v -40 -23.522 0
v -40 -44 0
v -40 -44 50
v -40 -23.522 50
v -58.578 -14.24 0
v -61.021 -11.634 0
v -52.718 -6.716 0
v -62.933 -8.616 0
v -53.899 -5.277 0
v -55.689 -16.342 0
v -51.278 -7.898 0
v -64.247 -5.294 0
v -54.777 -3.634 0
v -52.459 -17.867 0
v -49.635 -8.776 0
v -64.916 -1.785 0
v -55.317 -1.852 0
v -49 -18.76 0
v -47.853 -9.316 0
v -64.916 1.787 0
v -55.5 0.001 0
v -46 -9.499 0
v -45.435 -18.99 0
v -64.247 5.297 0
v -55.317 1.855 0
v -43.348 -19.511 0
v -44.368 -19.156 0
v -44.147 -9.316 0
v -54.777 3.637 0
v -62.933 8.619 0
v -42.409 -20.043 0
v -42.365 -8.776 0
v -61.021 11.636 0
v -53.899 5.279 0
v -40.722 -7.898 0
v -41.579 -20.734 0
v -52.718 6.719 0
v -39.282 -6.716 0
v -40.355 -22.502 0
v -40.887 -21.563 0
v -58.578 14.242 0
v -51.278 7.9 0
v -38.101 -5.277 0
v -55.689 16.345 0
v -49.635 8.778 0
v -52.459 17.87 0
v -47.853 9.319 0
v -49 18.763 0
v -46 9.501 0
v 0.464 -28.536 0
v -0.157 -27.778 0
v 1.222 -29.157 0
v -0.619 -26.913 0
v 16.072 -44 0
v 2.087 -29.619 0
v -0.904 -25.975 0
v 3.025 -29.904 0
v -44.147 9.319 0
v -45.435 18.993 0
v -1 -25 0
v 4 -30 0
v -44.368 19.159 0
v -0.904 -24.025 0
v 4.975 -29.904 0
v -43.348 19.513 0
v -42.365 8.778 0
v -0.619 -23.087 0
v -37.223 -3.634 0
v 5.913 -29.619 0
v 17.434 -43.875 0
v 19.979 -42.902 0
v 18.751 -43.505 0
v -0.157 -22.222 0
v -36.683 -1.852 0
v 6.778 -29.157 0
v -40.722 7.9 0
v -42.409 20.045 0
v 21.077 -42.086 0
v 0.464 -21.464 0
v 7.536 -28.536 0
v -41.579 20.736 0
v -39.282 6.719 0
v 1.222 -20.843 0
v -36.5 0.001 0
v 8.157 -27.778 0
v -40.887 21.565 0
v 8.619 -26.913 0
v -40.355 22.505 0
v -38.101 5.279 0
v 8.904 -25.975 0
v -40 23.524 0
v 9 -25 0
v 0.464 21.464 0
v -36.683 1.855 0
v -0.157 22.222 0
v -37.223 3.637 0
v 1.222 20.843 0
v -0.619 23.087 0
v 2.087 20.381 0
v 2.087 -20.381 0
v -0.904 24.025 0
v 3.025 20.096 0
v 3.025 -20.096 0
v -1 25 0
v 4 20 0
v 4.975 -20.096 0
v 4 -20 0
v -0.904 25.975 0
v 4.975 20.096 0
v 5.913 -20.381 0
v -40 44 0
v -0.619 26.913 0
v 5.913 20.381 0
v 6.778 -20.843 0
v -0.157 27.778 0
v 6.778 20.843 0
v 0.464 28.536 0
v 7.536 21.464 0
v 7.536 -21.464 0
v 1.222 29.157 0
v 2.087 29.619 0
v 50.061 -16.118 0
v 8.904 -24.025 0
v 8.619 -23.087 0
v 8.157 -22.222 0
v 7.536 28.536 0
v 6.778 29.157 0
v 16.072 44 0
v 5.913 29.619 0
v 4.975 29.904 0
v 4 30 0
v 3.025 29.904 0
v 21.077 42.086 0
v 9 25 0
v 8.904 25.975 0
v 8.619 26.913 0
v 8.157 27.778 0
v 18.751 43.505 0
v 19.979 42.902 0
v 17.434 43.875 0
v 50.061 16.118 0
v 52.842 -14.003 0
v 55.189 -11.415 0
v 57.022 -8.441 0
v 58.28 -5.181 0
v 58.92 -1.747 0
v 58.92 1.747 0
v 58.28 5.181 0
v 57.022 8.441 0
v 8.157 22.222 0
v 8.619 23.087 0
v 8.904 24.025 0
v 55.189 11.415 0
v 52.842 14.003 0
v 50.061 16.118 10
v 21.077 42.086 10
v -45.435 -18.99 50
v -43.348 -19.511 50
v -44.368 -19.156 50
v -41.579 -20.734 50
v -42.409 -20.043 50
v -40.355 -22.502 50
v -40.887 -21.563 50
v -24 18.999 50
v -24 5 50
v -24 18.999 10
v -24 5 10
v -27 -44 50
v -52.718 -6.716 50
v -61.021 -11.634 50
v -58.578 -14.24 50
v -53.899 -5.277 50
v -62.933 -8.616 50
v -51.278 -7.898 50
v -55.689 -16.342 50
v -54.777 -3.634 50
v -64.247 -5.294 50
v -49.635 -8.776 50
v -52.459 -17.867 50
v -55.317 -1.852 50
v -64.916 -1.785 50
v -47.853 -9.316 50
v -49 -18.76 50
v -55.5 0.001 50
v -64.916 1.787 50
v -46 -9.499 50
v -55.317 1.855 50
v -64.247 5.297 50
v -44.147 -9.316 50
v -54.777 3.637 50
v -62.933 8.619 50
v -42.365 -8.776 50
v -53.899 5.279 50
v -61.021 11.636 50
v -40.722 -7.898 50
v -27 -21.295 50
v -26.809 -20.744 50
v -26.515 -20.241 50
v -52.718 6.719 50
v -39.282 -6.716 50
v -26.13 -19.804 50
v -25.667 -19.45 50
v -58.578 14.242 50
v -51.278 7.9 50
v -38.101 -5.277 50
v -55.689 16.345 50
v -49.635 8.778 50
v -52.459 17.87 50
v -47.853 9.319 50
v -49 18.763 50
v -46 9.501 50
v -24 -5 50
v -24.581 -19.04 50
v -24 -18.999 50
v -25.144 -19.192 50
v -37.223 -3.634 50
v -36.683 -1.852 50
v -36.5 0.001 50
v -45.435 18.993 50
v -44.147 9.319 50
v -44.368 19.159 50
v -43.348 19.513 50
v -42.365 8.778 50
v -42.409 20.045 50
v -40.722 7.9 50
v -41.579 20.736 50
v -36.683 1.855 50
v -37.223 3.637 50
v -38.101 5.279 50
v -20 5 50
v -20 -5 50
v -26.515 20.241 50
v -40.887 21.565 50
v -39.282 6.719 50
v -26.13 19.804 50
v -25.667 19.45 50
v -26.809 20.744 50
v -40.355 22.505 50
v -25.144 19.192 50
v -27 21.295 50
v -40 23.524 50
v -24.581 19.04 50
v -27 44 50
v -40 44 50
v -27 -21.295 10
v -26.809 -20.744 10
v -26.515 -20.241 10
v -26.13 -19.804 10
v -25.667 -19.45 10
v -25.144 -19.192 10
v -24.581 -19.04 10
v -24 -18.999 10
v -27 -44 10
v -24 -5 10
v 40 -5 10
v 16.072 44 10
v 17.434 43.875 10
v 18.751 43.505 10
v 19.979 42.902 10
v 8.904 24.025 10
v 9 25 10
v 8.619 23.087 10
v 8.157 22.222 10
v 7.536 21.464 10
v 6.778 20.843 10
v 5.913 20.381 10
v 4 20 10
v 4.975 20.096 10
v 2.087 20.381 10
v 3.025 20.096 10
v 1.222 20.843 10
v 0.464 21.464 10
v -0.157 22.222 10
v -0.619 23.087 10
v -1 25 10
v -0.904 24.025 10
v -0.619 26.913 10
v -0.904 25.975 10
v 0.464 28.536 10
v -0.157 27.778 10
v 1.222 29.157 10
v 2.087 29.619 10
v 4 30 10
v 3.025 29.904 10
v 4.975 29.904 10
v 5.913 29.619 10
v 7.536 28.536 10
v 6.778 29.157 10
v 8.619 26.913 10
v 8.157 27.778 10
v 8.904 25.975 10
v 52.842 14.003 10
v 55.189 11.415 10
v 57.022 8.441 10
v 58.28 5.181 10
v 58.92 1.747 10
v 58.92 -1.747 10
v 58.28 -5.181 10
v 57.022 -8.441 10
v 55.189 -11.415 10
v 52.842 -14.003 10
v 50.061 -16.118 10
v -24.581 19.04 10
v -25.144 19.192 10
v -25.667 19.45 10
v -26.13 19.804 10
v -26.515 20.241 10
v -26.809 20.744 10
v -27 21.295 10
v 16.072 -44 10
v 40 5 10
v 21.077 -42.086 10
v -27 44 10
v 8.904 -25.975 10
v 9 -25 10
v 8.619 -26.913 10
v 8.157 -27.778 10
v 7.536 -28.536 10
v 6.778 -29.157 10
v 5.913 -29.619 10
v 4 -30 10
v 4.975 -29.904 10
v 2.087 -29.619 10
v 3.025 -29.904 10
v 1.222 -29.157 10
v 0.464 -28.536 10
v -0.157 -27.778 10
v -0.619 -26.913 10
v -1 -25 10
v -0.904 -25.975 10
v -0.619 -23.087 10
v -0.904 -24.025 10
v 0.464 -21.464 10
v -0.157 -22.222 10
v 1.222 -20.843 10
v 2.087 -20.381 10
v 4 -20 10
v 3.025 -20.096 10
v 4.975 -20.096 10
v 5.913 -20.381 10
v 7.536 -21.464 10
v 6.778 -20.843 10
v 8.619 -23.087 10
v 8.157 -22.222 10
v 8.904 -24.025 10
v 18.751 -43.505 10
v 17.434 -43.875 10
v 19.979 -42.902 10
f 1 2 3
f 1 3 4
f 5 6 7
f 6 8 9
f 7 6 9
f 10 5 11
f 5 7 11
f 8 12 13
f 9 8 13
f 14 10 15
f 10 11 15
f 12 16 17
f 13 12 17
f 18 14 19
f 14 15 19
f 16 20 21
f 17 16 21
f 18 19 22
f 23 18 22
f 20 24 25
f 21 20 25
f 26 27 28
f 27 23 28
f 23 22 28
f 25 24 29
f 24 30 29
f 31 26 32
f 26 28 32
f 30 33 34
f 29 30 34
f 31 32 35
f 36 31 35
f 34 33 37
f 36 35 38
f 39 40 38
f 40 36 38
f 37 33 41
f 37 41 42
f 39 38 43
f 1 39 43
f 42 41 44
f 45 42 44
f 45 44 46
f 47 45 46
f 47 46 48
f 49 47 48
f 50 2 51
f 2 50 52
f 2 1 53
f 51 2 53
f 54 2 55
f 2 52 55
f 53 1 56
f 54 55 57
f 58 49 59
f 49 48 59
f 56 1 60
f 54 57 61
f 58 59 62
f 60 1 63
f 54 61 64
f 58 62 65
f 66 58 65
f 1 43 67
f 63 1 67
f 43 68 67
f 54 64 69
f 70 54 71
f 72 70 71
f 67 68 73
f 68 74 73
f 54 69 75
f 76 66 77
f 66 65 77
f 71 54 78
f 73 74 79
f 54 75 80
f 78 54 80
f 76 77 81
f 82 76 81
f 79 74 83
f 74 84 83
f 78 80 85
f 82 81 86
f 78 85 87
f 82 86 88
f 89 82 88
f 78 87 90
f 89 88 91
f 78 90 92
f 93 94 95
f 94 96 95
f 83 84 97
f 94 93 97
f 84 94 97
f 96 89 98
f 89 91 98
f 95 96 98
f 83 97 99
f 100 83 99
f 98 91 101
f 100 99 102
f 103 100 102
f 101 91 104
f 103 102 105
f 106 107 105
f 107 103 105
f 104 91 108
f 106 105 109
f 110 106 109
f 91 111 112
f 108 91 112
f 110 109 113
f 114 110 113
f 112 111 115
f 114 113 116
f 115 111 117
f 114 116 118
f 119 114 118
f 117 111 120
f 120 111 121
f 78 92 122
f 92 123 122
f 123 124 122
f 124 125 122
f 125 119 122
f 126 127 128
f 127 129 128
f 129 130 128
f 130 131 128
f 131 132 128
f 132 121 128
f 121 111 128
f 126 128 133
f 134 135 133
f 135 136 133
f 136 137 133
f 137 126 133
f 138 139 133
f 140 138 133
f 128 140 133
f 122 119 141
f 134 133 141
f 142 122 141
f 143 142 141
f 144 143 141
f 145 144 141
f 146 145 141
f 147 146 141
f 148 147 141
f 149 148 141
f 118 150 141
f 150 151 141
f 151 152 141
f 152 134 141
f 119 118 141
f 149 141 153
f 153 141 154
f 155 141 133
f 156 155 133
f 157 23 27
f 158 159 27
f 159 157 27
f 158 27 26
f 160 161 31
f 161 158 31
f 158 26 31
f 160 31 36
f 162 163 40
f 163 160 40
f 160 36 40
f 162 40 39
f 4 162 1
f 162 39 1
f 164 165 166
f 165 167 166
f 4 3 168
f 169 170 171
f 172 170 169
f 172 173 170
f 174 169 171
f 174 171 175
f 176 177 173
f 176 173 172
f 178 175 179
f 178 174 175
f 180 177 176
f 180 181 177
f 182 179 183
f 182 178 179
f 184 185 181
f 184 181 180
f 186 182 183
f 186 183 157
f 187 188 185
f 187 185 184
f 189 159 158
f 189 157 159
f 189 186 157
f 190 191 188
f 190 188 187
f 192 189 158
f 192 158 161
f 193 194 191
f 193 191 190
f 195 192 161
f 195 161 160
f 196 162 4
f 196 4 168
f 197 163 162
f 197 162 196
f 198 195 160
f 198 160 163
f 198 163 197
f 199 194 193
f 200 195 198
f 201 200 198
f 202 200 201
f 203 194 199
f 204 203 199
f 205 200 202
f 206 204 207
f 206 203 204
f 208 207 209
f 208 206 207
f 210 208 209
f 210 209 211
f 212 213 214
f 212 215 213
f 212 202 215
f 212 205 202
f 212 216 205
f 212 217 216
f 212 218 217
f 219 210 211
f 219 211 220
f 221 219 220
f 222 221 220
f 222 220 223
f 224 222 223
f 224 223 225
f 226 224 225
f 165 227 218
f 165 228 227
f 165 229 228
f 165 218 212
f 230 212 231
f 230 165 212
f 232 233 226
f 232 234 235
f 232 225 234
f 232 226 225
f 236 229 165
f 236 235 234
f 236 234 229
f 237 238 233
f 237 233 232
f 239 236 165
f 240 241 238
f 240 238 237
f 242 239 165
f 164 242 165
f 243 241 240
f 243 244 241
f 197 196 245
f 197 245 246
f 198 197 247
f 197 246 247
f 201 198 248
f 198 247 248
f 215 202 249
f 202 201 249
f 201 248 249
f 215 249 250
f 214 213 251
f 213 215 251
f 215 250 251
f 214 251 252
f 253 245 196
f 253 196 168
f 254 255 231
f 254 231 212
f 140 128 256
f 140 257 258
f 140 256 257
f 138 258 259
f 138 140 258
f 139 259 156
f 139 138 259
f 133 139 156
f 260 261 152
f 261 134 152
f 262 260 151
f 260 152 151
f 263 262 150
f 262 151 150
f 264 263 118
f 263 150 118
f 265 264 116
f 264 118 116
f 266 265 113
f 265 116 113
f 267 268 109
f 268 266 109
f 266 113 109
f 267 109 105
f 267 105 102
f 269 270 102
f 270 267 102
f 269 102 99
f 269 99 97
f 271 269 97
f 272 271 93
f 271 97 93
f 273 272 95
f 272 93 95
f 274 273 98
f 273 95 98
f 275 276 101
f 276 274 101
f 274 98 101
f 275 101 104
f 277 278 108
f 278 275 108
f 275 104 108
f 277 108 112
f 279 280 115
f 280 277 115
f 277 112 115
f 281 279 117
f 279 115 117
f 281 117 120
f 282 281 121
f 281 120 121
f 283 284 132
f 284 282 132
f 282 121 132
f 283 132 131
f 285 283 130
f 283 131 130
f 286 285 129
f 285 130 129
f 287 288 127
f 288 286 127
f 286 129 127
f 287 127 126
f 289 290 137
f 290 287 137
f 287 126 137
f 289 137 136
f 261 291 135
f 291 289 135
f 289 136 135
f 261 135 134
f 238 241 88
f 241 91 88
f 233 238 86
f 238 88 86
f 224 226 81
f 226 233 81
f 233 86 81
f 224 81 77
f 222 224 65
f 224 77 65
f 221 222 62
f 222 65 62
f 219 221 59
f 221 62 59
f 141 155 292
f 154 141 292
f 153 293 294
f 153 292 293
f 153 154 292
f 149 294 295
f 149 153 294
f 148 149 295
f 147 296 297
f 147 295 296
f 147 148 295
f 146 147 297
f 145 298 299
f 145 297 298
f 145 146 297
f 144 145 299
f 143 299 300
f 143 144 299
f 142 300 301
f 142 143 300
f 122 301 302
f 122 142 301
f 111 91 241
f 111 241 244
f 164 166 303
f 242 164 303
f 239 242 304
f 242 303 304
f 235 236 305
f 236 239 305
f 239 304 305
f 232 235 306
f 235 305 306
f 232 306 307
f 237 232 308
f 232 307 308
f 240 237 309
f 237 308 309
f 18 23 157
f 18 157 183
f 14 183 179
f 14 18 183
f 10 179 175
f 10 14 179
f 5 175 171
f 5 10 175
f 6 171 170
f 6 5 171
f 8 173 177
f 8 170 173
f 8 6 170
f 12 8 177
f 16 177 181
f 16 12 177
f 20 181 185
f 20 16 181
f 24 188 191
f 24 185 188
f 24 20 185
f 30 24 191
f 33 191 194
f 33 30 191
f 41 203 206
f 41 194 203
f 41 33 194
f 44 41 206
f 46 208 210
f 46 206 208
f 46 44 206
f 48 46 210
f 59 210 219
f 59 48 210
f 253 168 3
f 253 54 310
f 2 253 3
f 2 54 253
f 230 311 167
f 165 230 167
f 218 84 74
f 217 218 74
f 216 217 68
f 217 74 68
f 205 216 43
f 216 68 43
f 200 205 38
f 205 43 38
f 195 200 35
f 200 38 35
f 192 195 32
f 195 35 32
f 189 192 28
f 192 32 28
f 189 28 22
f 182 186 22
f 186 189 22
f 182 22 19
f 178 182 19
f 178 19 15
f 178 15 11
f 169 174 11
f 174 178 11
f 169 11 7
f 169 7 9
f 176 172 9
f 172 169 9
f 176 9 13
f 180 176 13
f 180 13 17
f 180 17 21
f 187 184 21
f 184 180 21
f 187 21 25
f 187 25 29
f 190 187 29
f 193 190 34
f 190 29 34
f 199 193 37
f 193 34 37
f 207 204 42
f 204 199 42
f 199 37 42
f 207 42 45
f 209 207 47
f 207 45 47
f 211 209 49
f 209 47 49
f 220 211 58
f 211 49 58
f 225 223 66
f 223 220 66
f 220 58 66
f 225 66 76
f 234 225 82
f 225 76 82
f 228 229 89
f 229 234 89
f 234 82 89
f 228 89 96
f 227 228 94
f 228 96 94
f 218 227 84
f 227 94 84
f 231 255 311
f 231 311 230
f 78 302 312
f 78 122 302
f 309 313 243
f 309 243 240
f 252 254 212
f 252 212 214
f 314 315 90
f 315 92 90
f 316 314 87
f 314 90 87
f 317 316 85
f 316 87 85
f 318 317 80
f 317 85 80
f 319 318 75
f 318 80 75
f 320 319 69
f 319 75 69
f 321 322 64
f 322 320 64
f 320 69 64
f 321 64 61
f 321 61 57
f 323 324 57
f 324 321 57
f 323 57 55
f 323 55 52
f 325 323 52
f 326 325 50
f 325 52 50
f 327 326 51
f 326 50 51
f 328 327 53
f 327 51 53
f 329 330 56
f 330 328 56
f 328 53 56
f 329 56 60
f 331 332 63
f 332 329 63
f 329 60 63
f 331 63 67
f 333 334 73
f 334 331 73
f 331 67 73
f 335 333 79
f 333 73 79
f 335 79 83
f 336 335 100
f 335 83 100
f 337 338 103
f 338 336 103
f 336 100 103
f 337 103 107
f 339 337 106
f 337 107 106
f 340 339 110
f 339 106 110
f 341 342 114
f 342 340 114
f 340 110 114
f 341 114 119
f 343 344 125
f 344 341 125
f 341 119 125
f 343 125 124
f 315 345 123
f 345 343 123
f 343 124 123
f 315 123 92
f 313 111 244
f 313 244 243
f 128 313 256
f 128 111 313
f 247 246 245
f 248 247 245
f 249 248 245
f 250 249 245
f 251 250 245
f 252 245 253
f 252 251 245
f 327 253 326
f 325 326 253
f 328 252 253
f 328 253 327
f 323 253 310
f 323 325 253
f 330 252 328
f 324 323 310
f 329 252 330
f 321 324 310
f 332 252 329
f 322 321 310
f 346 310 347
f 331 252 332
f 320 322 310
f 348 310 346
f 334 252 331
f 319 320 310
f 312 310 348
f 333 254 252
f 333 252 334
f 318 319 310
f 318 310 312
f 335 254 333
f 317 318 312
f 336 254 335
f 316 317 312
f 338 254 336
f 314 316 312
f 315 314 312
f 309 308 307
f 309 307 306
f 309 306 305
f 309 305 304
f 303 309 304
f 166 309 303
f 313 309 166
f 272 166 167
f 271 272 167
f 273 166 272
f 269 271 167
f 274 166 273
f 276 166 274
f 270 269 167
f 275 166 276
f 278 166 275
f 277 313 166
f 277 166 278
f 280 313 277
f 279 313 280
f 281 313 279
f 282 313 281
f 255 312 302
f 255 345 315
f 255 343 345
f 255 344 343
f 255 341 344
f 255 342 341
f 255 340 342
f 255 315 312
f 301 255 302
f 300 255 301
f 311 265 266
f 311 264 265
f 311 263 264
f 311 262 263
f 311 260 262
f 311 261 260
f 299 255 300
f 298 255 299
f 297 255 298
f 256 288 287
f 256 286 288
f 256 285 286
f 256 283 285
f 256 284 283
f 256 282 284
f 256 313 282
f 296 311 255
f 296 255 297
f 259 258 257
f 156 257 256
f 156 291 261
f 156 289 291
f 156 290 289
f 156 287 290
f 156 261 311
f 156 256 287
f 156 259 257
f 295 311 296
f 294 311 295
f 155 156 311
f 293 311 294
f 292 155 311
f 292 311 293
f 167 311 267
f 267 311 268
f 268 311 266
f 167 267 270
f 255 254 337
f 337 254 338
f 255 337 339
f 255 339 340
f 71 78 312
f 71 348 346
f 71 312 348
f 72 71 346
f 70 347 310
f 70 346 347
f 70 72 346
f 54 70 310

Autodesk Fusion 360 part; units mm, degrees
sketch "Base_Sketch" plane through (0, 0, 0) normal (0, 0, 1) x (1, 0, 0)
  line L0 (-40, 44) -> (16.0721, 44)
  line L1 (16.0721, -44) -> (-40, -44)
  line L2 (-24, 5) -> (-24, 18.9991)
  line L3 (-24, -5) -> (-24, -18.9991)
  arc A0 (-27, 21.2952) -> (-24, 18.9991) centre (-24.0835, 21.9979) ccw
  line L4 (-27, 44) -> (-27, 21.2952)
  line L5 (-27, -21.2952) -> (-27, -44)
  arc A1 (-27, -17.4935) -> (-27, -17.4935) centre (-24.0728, -22.0228) ccw
  line L6 (-20, 0) -> (-20, 5)
  line L7 (-20, 5) -> (-20, 0)
  line L8 (-20, 0) -> (-20, -5)
  line L9 (-20, 5) -> (-24, 5)
  line L10 (-20, -5) -> (-24, -5)
  circle A2 centre (-46, 0.0012) radius 9.5
  arc A3 (-45.4349, 18.9928) -> (-45.4349, -18.9904) centre (-46, 0.0012) ccw
  arc A4 (-45.4349, 18.9928) -> (-40, 23.5243) centre (-45.8206, 24.9804) ccw
  line L11 (-40, -44) -> (-40, -23.5218)
  line L12 (-40, 23.5243) -> (-40, 44)
  arc A5 (-40, -23.5218) -> (-45.4349, -18.9904) centre (-45.8206, -24.978) ccw
  arc A6 (-24, -18.9991) -> (-27, -21.2952) centre (-24.0835, -21.9979) ccw
  arc A7 (50.0608, -16.1177) -> (50.0608, 16.1177) centre (40, 0) ccw
  circle A8 centre (4, 25) radius 5
  circle A9 centre (4, -25) radius 5
  line L13 (50.0608, -16.1177) -> (21.0769, -42.0859)
  arc A10 (16.0721, -44) -> (21.0769, -42.0859) centre (16.0721, -36.5) ccw
  line L14 (50.0608, 16.1177) -> (21.0769, 42.0859)
  arc A11 (21.0769, 42.0859) -> (16.0721, 44) centre (16.0721, 36.5) ccw
  dimension "d3" = 13
  dimension "d7" = 3
  dimension "d9" = 4
  dimension "d11" = 19
  dimension "d12" = 38
  dimension "d13" = 12
  dimension "d14" = 38
  dimension "d19" = 10
  dimension "d22" = 7.5
extrude "Extrude1" add sketch "Base_Sketch" along normal blind 10 contours L0 L1 L2 L3 A0 L4 L5 A1 L6 L7 L8 L9 L10 A7 L13 A10 L14 A11 | L3 L5 A1 A6 picked at (-23.8485, -22.1321)
extrude "Extrude2" add sketch "Base_Sketch" along normal blind 50 contours L0 L1 L2 L3 A0 L4 L5 A1 L6 L7 L8 L9 L10 A3 A4 L11 L12 A5 | L3 L5 A1 A6 picked at (-28.5466, -20.9909)
sketch "Triangle_Sketch" plane through (0, 0, 0) normal (0, 1, 0) x (1, 0, 0)
  line L0 (-20, -50) -> (-20, -10)
  line L1 (-20, -10) -> (40, -10)
  line L2 (40, -10) -> (-20, -50)
  dimension "d27" = 60
extrude "Extrude3" add sketch "Triangle_Sketch" along normal mid plane 10
